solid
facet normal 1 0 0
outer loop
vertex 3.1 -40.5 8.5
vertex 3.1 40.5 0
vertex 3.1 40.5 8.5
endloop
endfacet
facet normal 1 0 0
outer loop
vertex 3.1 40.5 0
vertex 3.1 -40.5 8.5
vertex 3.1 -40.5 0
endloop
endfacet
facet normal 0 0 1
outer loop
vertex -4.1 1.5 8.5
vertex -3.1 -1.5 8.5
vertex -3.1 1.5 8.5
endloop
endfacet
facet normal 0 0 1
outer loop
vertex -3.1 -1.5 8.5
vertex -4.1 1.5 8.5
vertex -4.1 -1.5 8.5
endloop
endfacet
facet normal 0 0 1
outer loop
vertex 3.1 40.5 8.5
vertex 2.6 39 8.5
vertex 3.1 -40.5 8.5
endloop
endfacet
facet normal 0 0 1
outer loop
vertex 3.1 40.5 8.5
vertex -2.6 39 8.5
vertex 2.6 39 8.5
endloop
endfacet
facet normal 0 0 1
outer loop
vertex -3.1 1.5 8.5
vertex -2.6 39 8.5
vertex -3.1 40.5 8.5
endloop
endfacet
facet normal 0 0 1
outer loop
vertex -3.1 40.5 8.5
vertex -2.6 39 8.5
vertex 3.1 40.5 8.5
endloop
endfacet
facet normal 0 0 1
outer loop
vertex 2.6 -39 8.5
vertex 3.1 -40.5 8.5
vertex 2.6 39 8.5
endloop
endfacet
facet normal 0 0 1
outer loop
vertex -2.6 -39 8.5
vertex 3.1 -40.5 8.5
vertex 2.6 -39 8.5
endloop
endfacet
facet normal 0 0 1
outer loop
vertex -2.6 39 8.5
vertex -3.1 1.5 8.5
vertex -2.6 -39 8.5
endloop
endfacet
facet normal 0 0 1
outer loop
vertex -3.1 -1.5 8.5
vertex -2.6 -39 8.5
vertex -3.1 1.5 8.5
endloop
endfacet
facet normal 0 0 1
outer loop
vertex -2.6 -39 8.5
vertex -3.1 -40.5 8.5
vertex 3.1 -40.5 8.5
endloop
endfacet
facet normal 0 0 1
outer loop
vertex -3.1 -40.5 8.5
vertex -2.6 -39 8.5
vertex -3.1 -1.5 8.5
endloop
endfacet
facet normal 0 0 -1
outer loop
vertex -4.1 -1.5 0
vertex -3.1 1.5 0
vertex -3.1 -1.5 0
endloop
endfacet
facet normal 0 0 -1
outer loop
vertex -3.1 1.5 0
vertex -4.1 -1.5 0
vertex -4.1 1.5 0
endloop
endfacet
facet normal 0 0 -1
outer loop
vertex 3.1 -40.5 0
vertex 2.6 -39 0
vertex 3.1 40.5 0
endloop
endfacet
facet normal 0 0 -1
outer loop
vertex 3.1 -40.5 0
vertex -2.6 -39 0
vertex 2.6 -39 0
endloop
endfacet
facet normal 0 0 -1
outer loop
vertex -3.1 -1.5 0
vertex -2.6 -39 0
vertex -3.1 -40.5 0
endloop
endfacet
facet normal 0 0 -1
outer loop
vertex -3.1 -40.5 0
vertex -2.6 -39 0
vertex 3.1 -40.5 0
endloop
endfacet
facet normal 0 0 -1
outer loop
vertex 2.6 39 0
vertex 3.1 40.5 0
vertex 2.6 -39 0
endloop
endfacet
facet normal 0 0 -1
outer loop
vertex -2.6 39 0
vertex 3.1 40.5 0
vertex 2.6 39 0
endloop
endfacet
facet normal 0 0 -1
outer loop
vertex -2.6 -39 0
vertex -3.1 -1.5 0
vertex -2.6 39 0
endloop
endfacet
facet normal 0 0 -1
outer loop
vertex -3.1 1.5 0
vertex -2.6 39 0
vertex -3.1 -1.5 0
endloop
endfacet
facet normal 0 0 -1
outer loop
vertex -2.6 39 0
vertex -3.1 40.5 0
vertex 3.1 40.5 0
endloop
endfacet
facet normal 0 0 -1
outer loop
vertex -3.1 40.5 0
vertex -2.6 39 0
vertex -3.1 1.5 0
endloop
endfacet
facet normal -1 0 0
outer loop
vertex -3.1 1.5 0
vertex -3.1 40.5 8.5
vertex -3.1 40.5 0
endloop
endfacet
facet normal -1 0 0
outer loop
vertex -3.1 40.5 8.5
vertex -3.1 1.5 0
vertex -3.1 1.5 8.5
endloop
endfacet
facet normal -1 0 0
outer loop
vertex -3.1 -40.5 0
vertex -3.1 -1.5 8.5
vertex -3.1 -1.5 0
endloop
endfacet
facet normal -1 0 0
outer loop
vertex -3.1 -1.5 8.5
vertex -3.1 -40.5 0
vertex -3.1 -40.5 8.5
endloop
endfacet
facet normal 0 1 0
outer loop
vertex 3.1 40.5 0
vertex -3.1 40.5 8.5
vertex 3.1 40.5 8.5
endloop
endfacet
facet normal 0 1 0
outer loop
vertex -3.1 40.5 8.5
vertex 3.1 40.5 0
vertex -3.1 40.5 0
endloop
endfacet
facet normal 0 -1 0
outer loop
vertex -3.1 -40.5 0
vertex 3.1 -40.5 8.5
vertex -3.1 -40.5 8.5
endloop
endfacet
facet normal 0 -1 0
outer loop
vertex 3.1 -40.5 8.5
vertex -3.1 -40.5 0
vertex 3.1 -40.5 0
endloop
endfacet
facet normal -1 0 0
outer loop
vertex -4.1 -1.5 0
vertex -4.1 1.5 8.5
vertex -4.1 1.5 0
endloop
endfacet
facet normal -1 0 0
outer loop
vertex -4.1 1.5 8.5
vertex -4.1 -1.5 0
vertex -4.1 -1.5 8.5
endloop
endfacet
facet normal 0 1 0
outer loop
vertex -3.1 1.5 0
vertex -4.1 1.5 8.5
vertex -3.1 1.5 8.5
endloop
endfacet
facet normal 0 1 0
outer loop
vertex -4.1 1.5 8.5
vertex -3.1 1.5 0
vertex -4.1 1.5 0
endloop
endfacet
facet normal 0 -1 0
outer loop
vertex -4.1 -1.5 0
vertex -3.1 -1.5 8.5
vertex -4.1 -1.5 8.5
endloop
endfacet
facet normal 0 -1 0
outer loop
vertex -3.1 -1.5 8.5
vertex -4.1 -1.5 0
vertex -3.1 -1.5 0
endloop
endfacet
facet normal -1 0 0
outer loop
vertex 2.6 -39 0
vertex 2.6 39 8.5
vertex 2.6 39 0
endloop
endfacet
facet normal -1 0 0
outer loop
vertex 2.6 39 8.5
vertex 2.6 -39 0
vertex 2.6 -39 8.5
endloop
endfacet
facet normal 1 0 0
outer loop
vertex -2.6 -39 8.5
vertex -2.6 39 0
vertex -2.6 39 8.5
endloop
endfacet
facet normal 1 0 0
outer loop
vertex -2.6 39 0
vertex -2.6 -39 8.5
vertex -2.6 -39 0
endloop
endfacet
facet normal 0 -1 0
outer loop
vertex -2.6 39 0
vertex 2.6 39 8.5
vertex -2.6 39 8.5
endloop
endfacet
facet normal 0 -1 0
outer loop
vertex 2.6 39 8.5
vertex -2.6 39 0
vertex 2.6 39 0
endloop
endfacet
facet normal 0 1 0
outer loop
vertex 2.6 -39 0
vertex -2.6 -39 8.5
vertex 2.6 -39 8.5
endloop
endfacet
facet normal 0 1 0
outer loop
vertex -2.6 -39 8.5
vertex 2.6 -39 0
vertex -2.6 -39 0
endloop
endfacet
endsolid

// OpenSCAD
PINHEADER_WIDTH = 5.2;
PINHEADER_LENGTH = 78;
PINHEADER_HEIGHT = 8.5;

IDC_WIDTH = 6.2;
IDC_LENGTH = 81;
IDC_NUB_WIDTH = 3;
IDC_NUB_THICKNESS = 1;

module adapter() {
  difference() {
    union() {
      translate([-IDC_WIDTH/2, -IDC_LENGTH/2, 0])
      cube(size = [IDC_WIDTH, IDC_LENGTH, PINHEADER_HEIGHT]);
      translate([-IDC_WIDTH/2 - IDC_NUB_THICKNESS, -IDC_NUB_WIDTH/2, 0])
      cube(size = [IDC_NUB_THICKNESS, IDC_NUB_WIDTH, PINHEADER_HEIGHT]);
    }
    translate([-PINHEADER_WIDTH/2, -PINHEADER_LENGTH/2, 0])
    cube(size = [PINHEADER_WIDTH, PINHEADER_LENGTH, PINHEADER_HEIGHT]);
  }
}

adapter();
